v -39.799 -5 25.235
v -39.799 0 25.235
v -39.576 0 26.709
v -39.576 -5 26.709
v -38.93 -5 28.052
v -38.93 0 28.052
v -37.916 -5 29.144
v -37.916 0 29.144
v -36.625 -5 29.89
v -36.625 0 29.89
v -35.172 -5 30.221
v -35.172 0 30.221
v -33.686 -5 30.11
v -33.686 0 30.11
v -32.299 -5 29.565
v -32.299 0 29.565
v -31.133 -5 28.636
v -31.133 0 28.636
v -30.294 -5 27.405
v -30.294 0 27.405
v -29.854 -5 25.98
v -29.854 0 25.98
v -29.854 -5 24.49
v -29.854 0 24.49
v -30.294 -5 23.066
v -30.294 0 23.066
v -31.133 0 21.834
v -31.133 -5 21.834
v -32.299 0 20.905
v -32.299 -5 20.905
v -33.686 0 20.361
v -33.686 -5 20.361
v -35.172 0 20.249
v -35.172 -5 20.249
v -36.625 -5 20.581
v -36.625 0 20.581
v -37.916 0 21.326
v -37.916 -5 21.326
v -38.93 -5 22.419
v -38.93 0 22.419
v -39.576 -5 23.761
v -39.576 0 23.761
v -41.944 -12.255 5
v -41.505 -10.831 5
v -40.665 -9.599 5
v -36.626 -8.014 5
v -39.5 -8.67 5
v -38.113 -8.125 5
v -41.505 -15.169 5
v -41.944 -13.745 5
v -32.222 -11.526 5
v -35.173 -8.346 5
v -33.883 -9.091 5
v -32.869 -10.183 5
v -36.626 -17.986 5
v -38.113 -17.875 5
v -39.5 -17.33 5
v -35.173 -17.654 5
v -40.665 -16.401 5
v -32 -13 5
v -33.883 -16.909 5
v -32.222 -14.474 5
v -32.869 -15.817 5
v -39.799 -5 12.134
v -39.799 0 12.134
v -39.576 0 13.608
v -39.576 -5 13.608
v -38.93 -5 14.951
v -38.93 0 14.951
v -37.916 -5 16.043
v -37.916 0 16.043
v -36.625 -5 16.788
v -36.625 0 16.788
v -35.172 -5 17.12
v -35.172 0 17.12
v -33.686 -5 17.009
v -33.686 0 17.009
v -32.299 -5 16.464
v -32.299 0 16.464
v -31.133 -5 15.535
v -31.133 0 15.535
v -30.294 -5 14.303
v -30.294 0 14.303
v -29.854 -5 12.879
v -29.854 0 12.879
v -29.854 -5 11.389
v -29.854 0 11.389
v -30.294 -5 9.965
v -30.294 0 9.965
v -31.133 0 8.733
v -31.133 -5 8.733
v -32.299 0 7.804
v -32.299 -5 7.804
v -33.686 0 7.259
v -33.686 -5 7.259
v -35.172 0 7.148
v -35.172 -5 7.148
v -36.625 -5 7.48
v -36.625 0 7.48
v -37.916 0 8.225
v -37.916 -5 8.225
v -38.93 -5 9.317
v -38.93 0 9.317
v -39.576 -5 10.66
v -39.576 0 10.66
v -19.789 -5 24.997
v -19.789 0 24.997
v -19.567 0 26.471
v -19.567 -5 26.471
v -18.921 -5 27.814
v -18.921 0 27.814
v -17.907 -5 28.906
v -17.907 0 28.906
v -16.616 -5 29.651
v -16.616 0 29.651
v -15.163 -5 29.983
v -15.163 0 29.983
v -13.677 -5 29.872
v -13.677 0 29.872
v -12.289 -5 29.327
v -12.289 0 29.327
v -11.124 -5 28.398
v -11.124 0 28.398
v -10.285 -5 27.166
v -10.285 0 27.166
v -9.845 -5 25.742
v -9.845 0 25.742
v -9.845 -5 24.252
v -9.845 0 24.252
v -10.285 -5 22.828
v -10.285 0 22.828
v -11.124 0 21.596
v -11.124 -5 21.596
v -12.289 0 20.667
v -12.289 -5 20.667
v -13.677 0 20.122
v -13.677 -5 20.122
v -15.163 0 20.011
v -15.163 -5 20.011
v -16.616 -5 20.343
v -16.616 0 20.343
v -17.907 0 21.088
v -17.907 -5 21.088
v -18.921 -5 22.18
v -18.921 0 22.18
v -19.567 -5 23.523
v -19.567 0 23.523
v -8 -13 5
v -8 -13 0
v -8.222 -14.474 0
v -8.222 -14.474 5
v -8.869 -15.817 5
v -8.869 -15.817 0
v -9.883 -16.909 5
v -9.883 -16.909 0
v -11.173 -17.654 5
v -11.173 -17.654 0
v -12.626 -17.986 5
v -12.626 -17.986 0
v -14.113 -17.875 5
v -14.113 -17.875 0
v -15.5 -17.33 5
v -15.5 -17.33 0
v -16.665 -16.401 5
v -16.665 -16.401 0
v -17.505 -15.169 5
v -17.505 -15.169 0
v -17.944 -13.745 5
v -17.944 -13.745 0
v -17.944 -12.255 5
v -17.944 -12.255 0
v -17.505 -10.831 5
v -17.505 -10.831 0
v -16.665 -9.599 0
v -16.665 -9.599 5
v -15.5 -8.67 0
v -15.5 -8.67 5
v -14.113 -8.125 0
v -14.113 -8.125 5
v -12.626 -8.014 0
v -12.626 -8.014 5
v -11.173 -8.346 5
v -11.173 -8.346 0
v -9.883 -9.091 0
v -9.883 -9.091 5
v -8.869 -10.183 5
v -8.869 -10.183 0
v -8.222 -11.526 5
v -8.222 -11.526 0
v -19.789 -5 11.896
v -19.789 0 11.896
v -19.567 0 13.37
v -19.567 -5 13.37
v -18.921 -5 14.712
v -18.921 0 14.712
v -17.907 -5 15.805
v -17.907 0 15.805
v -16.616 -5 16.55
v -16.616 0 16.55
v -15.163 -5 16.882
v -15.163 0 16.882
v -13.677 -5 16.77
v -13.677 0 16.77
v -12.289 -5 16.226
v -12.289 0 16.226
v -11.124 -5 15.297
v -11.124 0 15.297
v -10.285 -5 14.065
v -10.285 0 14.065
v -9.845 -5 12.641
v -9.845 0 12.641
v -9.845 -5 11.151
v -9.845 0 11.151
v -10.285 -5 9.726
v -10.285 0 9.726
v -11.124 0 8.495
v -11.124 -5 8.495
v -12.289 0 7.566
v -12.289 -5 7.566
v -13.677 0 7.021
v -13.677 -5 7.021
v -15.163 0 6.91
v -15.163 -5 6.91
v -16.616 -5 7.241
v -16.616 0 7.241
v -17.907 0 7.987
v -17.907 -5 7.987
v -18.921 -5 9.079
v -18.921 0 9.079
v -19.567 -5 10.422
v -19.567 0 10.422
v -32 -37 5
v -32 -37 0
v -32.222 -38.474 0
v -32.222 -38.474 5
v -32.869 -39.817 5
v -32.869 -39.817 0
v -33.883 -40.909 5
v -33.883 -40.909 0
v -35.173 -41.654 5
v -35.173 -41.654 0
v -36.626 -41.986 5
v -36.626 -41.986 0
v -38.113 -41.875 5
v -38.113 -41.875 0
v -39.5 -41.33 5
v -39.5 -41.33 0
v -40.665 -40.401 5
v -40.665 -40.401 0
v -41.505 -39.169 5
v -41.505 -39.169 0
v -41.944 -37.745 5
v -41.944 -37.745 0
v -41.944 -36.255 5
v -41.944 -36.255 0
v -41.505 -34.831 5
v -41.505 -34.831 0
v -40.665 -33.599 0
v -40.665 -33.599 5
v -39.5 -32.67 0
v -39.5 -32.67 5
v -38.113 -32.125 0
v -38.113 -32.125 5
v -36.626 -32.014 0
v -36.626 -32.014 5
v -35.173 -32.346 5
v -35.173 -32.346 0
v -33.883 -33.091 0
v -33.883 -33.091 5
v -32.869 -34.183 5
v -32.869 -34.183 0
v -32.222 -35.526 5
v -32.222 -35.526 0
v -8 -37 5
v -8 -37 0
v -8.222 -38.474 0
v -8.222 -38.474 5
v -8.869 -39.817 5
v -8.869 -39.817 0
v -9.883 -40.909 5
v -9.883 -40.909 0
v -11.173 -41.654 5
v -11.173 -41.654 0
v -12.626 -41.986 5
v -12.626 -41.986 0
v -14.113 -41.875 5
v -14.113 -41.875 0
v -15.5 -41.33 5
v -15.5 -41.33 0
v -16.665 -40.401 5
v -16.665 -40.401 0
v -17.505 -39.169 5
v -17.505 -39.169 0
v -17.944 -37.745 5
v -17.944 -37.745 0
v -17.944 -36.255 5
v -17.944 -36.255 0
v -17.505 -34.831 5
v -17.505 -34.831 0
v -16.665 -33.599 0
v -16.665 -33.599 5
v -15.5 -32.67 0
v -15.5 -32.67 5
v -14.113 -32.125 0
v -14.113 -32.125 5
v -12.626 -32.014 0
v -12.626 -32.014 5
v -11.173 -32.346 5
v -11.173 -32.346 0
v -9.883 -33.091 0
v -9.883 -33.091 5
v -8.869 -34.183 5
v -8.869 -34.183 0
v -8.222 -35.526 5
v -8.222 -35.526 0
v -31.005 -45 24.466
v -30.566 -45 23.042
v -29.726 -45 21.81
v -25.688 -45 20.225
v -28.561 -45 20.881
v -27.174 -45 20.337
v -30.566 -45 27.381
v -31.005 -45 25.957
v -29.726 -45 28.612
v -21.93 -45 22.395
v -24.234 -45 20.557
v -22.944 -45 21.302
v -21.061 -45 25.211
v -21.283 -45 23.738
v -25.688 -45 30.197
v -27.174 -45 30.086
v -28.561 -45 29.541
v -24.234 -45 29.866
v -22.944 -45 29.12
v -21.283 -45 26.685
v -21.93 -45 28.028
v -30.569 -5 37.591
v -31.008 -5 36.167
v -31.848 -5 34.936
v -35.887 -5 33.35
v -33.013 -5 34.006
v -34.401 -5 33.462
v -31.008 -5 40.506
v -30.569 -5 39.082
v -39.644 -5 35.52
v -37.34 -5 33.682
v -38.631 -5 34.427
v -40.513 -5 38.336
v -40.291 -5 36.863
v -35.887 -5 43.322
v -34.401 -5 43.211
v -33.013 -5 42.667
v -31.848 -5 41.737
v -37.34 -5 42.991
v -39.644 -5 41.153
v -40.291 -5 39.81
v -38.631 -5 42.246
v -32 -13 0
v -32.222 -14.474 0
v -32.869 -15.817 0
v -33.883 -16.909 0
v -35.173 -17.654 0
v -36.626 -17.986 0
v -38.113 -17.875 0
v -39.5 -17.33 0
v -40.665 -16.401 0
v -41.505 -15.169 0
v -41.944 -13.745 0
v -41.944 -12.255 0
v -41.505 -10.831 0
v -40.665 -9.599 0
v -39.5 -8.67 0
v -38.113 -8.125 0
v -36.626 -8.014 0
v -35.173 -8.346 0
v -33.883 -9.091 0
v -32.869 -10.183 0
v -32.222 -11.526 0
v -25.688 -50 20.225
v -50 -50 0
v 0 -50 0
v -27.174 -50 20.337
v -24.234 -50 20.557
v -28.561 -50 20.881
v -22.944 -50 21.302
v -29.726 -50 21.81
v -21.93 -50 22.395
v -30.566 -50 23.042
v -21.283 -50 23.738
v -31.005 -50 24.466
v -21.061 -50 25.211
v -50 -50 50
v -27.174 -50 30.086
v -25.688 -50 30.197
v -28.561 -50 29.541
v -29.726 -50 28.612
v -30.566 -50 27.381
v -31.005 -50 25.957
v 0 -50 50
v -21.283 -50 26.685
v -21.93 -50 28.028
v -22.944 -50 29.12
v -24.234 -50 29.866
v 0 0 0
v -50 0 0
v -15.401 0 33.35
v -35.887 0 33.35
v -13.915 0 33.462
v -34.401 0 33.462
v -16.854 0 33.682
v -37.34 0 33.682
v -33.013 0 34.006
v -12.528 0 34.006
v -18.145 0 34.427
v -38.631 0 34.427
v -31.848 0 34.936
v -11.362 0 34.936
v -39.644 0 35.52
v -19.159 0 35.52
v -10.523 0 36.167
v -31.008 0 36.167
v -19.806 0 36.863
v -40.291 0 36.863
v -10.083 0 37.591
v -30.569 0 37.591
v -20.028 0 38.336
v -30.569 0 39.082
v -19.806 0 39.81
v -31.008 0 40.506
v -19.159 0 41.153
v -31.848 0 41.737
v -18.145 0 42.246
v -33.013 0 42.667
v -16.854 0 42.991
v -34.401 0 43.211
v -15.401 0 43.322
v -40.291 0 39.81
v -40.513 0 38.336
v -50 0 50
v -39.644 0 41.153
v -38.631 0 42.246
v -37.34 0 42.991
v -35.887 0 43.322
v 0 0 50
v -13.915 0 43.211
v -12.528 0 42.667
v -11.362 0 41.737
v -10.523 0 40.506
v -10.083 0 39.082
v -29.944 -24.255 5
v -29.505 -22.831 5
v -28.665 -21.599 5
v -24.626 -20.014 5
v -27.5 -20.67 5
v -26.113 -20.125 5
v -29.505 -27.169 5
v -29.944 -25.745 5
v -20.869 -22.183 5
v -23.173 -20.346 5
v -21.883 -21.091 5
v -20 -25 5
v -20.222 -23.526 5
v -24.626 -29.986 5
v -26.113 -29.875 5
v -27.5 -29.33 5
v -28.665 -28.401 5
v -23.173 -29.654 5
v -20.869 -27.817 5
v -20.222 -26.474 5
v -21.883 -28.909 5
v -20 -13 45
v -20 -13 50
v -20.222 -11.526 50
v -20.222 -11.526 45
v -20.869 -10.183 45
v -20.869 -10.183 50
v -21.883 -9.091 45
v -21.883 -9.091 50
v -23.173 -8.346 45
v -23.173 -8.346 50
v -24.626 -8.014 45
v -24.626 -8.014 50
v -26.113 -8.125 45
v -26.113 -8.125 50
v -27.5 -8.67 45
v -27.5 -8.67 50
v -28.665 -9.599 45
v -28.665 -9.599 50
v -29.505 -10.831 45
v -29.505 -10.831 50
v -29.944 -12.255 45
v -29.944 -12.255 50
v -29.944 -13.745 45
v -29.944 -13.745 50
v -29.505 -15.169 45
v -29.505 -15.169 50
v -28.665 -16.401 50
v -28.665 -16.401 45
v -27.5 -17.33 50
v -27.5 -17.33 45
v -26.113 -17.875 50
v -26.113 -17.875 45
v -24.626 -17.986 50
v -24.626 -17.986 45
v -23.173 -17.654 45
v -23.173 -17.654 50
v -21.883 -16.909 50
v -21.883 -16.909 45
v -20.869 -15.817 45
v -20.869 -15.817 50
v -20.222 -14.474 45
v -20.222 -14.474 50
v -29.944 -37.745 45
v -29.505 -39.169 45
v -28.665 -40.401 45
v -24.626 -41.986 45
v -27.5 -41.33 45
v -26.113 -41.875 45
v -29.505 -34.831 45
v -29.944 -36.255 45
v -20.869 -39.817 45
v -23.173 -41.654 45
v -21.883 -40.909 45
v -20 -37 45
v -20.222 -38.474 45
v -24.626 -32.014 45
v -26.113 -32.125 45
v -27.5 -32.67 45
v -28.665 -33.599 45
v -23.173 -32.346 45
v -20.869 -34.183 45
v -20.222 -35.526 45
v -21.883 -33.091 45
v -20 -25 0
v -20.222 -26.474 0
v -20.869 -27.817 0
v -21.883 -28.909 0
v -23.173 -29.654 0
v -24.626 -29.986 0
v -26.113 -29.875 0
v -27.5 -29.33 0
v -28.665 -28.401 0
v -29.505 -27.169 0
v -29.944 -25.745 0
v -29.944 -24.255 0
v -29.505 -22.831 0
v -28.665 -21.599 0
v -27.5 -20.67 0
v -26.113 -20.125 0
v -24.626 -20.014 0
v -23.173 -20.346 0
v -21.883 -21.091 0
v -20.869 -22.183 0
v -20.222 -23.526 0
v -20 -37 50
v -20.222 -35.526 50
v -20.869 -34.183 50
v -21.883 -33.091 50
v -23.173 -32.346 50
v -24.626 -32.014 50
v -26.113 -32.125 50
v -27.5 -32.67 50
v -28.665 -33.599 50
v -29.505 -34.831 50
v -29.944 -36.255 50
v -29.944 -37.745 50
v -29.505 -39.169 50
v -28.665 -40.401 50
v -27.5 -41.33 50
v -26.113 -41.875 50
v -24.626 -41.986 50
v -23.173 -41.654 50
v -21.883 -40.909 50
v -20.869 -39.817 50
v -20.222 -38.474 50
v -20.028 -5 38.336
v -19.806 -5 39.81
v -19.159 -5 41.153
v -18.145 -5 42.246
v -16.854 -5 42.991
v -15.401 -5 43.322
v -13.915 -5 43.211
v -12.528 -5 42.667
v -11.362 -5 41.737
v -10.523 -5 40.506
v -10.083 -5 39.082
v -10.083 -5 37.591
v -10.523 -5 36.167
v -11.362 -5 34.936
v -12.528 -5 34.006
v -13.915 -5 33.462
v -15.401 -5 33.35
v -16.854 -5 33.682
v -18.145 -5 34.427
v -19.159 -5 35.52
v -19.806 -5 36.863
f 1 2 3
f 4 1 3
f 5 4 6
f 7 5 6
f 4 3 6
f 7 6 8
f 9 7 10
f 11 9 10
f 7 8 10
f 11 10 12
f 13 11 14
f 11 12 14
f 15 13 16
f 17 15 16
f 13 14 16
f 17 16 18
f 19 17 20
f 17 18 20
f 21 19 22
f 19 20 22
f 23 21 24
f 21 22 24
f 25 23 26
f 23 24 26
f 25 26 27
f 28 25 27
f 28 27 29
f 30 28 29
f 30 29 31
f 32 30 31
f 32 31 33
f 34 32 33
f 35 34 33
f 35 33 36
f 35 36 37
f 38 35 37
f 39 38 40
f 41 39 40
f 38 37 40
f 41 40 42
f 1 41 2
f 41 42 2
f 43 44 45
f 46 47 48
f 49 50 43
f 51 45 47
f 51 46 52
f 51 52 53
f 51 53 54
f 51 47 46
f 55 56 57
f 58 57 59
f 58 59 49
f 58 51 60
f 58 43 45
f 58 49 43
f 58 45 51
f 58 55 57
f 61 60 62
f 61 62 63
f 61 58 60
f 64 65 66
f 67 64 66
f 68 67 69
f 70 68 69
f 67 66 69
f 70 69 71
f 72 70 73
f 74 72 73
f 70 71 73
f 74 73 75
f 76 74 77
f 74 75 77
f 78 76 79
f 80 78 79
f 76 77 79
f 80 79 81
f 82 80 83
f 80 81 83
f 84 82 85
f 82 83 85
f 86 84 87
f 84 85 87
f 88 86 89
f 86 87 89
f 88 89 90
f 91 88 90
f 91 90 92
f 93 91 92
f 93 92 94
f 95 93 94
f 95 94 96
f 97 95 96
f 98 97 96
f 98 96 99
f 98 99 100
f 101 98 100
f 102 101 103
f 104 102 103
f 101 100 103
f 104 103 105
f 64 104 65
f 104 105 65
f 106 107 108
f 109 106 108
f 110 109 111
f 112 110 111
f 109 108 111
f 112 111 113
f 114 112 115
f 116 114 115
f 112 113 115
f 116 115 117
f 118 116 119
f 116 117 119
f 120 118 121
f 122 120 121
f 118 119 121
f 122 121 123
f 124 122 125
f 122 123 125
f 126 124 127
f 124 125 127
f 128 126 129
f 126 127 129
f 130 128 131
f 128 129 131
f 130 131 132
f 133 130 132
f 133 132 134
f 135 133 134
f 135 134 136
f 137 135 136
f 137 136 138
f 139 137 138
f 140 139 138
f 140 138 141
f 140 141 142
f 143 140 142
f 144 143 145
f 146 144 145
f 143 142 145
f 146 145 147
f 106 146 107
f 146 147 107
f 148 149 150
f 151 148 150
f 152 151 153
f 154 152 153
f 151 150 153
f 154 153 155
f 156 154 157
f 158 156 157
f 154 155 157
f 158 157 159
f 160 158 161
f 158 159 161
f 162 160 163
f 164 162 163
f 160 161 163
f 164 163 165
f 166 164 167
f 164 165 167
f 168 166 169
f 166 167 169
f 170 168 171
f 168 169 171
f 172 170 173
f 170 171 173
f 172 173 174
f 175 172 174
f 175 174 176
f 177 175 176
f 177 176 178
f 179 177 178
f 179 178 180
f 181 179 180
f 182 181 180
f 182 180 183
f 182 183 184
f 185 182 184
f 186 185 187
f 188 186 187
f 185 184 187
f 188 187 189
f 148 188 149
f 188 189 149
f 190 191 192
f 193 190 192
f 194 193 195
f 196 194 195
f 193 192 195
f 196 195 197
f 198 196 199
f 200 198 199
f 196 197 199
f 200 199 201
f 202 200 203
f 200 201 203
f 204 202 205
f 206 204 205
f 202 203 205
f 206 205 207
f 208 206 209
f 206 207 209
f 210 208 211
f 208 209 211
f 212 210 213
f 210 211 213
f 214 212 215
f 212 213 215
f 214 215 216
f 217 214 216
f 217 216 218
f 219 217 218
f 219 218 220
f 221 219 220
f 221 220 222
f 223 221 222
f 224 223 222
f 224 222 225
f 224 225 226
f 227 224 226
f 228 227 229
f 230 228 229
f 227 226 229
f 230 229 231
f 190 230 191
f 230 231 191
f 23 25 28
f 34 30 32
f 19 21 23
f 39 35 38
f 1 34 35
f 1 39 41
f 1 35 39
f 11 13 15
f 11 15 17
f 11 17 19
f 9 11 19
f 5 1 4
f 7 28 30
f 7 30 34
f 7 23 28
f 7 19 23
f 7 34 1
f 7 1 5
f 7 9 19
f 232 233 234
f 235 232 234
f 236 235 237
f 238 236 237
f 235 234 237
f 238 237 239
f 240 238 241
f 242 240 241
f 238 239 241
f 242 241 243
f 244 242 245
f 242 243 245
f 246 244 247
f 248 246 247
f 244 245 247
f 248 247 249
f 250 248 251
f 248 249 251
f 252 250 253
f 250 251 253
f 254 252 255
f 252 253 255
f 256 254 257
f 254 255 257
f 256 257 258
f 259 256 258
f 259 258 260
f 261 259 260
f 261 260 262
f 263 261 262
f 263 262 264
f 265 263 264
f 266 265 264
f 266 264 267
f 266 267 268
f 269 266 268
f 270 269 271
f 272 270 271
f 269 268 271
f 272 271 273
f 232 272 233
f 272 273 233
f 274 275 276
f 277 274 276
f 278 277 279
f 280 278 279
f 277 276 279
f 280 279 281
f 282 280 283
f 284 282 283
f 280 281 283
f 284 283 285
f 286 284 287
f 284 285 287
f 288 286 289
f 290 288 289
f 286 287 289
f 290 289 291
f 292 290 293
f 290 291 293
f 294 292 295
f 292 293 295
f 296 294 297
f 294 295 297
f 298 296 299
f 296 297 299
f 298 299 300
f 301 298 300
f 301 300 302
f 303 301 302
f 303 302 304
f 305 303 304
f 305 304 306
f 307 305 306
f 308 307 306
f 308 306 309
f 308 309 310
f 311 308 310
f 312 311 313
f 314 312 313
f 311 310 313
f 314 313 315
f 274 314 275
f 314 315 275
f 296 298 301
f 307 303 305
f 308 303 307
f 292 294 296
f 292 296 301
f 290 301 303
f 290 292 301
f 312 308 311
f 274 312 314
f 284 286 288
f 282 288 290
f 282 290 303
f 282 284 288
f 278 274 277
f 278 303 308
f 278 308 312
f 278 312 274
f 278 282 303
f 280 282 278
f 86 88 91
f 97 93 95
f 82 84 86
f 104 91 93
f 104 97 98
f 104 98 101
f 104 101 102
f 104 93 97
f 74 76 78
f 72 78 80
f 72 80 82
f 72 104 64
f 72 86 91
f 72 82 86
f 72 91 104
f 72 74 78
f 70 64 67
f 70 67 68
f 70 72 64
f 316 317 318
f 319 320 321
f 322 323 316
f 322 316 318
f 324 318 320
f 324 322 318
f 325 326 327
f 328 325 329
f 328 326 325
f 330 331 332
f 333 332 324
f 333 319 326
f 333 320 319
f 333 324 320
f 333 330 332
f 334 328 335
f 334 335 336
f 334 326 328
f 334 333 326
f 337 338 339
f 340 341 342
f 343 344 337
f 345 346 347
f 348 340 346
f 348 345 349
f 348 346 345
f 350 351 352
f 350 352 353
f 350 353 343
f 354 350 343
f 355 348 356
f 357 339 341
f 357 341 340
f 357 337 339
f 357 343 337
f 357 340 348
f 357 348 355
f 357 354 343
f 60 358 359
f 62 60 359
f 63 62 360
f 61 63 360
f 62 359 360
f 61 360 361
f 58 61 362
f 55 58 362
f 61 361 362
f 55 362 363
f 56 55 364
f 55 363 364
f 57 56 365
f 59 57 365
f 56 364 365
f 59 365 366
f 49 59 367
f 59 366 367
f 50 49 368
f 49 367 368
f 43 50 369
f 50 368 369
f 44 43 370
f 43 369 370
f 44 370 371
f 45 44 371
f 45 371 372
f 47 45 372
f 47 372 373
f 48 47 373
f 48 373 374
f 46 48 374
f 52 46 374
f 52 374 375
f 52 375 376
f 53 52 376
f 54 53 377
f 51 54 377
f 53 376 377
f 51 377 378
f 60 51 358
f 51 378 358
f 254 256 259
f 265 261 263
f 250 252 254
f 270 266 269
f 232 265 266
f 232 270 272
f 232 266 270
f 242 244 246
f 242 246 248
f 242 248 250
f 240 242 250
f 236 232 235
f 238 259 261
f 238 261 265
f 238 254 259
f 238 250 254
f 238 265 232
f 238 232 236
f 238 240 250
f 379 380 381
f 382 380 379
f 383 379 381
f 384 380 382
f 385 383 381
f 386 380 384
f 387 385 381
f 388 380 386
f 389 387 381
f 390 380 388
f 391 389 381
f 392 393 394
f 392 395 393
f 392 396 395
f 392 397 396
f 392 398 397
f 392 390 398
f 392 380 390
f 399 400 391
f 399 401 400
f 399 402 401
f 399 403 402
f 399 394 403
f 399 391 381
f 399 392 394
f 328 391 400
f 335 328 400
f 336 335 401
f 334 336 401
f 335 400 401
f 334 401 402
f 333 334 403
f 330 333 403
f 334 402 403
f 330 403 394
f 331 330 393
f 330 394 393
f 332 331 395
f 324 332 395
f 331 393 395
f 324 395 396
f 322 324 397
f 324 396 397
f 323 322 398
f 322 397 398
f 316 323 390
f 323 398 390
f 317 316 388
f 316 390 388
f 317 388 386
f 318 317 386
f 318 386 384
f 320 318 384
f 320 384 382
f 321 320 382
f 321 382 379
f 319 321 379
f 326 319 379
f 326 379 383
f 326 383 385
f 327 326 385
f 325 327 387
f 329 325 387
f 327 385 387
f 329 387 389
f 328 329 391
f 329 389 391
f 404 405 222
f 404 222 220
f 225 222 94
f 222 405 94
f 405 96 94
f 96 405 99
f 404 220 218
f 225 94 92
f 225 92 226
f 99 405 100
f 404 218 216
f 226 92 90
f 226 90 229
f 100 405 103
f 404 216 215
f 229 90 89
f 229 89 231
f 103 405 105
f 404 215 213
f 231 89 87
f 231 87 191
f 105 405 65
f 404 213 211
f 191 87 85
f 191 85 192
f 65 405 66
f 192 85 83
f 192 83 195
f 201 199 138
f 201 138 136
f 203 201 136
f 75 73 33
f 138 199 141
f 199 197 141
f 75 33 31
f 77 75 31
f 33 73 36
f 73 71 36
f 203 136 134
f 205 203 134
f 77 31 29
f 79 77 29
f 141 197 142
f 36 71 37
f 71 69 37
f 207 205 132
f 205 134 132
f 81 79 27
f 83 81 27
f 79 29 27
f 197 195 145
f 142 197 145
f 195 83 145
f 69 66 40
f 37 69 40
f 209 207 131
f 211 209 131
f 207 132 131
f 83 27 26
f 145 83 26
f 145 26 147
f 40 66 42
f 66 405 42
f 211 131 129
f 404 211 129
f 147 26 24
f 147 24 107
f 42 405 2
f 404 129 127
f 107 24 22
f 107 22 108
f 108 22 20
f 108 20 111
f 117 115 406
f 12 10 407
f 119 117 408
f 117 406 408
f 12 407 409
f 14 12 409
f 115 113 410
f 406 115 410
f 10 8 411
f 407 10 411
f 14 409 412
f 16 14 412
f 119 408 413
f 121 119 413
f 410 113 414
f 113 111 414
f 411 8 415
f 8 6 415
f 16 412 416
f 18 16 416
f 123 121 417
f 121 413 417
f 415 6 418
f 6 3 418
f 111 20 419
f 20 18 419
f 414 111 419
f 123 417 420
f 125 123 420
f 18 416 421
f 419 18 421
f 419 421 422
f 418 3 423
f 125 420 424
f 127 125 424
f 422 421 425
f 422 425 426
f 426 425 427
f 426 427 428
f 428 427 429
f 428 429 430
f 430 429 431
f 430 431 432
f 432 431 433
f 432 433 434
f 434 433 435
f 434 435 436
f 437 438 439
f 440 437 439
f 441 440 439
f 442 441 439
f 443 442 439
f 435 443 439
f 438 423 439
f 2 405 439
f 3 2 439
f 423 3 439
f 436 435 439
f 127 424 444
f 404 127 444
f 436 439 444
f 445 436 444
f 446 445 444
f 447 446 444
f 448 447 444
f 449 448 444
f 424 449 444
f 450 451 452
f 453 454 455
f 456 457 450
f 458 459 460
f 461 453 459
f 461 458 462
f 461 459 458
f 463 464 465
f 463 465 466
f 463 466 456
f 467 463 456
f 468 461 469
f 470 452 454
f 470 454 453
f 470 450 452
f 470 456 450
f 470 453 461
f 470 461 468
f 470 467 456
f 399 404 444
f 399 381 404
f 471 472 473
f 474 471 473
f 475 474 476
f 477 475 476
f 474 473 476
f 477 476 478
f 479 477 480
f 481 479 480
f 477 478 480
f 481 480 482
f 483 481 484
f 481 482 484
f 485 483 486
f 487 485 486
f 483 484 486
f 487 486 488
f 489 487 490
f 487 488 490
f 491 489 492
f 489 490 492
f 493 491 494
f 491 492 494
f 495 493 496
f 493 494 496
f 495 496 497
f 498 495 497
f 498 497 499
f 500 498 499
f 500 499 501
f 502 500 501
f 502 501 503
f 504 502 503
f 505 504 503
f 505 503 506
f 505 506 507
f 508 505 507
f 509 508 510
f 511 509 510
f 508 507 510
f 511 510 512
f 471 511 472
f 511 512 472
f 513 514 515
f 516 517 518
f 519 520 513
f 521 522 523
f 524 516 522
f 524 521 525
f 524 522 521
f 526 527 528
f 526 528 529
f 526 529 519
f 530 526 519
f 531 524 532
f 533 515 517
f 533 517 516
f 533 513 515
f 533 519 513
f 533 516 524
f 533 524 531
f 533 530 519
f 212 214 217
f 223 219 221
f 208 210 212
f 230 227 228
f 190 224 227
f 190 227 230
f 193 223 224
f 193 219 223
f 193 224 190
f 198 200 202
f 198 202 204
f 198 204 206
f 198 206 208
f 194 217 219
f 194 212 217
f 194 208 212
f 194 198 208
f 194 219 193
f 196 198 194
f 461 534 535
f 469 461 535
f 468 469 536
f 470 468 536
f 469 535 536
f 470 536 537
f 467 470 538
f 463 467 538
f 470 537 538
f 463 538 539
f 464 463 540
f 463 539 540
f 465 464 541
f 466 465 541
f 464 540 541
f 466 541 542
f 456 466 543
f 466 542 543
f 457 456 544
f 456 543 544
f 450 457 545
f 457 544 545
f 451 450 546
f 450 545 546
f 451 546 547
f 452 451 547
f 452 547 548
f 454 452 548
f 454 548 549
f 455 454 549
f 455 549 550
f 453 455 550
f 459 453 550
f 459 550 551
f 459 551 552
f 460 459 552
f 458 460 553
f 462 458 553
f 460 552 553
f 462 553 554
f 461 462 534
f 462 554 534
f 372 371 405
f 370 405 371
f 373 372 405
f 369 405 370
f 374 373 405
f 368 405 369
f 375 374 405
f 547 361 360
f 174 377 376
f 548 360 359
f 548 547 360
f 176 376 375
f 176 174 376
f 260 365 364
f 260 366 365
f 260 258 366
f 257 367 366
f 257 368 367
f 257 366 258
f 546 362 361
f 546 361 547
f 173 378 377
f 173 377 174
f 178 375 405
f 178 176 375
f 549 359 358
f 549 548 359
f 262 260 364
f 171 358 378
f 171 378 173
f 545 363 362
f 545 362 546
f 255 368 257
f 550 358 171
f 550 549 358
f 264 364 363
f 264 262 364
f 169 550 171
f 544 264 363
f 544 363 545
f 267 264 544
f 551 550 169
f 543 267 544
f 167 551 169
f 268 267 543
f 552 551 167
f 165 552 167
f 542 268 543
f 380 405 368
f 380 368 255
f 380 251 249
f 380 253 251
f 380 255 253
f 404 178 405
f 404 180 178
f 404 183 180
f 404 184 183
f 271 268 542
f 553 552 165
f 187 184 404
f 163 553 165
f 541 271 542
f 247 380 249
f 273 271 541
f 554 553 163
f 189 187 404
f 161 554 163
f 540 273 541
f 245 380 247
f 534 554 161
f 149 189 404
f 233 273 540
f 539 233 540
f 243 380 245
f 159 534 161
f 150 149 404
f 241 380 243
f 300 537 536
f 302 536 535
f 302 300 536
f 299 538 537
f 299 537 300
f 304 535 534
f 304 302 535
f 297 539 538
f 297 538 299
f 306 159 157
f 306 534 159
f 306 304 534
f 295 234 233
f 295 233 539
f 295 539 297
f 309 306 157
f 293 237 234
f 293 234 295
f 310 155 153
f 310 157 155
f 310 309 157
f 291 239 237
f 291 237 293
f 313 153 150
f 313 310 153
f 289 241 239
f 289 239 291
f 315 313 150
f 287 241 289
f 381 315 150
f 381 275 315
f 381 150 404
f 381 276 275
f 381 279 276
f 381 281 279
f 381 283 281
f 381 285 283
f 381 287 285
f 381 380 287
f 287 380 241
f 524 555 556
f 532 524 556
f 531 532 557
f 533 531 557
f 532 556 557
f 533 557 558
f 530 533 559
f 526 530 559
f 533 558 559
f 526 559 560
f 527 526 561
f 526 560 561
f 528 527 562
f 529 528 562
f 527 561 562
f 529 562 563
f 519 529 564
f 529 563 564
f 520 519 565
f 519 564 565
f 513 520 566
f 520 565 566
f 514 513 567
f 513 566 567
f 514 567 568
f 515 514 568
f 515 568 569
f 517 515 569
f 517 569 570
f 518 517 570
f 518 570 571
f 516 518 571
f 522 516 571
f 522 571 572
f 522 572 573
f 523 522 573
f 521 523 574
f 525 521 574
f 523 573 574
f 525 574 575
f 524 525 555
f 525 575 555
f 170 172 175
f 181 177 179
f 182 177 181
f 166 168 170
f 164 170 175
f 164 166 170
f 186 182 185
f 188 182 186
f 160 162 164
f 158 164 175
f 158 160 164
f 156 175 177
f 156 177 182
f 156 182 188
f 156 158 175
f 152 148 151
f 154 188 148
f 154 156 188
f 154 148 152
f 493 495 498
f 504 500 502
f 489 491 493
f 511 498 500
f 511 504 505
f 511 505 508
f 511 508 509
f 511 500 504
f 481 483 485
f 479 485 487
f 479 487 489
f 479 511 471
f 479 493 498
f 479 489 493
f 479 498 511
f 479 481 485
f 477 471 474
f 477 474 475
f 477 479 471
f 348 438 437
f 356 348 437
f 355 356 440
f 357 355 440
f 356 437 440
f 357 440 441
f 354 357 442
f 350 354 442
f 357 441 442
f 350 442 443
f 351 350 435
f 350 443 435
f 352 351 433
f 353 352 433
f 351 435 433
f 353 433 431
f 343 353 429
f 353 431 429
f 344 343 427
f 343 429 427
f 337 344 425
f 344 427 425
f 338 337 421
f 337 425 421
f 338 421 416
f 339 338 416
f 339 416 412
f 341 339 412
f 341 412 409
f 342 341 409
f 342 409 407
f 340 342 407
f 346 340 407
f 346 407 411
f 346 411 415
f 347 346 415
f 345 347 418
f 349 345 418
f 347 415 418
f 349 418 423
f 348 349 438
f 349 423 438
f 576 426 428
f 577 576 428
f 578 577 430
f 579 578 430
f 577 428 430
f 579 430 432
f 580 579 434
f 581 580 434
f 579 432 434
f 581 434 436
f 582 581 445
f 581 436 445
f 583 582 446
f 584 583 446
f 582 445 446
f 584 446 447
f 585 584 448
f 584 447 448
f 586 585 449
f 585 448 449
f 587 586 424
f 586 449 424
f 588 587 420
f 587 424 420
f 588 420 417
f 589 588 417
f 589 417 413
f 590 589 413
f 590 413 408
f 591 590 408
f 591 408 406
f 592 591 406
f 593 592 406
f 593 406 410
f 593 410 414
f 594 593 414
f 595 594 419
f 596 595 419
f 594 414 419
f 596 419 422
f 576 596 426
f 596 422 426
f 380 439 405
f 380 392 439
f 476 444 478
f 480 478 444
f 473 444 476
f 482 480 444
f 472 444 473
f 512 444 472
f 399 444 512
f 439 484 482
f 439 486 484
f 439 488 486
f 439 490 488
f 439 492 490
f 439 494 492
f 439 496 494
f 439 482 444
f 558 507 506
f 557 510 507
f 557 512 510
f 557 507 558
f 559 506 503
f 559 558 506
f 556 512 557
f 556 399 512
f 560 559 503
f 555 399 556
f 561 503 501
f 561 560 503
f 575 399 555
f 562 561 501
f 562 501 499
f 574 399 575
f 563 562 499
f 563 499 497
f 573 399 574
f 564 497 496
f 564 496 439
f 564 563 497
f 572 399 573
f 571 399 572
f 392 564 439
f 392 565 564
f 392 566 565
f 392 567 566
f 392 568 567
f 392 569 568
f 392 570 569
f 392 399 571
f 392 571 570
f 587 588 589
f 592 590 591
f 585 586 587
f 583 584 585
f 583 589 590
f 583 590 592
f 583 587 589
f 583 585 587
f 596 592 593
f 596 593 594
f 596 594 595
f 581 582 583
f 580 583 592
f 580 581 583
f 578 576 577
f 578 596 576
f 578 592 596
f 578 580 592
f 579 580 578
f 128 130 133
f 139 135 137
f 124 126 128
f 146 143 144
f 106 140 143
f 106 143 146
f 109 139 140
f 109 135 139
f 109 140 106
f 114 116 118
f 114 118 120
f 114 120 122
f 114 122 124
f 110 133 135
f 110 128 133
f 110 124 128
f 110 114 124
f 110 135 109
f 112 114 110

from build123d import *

# Parameters (mm, degrees)
F0_W      = 50
F0_H      = 50
F2_W      = 50
F2_H      = 50
F4_R      = 5
F5_DEPTH  = 5
F6_R      = 5
F7_DEPTH  = 5
F9_R      = 5
F10_DEPTH = 5
F11_R     = 5
F12_DEPTH = 5


with BuildPart() as f3:
    # F0 (on Front) → F3 section 0
    with BuildSketch(Plane.XZ):
        with Locations((-25, 25)):
            Rectangle(F0_W, F0_H)
    # F2 (on offset) → F3 section 1
    with BuildSketch(Plane.XZ.offset(50)):
        with Locations((-25, 25)):
            Rectangle(F2_W, F2_H)
    loft()

    # F4 (on face) → F5 (cut)
    with BuildSketch(Plane.XZ.offset(50)):
        with Locations((-26.061153, 25.211331)):
            Circle(F4_R)
    extrude(amount=-F5_DEPTH, mode=Mode.SUBTRACT)

    # F6 (on face) → F7 (cut)
    with BuildSketch(Plane(origin=(0, 0, 0), x_dir=(1, 0, 0), z_dir=(0, 0, -1))):
        with Locations((-25, 25)):
            Circle(F6_R)
        with Locations((-37, 37)):
            Circle(F6_R)
        with Locations((-13, 37)):
            Circle(F6_R)
        with Locations((-13, 13)):
            Circle(F6_R)
        with Locations((-37, 13)):
            Circle(F6_R)
    extrude(amount=-F7_DEPTH, mode=Mode.SUBTRACT)

    # F9 (on face) → F10 (cut)
    with BuildSketch(Plane(origin=(0, 0, 0), x_dir=(-1, 0, 0), z_dir=(0, 1, 0))):
        with Locations((15.027642, 38.336441)):
            Circle(F9_R)
        with Locations((14.789439, 24.997041)):
            Circle(F9_R)
        with Locations((14.789439, 11.895845)):
            Circle(F9_R)
        with Locations((35.513151, 38.336441)):
            Circle(F9_R)
        with Locations((34.798544, 25.235245)):
            Circle(F9_R)
        with Locations((34.798544, 12.134047)):
            Circle(F9_R)
    extrude(amount=-F10_DEPTH, mode=Mode.SUBTRACT)

    # F11 (on face) → F12 (cut)
    with BuildSketch(Plane.XY.offset(50)):
        with Locations((-25, -37)):
            Circle(F11_R)
        with Locations((-25, -13)):
            Circle(F11_R)
    extrude(amount=-F12_DEPTH, mode=Mode.SUBTRACT)


solid = f3.part
